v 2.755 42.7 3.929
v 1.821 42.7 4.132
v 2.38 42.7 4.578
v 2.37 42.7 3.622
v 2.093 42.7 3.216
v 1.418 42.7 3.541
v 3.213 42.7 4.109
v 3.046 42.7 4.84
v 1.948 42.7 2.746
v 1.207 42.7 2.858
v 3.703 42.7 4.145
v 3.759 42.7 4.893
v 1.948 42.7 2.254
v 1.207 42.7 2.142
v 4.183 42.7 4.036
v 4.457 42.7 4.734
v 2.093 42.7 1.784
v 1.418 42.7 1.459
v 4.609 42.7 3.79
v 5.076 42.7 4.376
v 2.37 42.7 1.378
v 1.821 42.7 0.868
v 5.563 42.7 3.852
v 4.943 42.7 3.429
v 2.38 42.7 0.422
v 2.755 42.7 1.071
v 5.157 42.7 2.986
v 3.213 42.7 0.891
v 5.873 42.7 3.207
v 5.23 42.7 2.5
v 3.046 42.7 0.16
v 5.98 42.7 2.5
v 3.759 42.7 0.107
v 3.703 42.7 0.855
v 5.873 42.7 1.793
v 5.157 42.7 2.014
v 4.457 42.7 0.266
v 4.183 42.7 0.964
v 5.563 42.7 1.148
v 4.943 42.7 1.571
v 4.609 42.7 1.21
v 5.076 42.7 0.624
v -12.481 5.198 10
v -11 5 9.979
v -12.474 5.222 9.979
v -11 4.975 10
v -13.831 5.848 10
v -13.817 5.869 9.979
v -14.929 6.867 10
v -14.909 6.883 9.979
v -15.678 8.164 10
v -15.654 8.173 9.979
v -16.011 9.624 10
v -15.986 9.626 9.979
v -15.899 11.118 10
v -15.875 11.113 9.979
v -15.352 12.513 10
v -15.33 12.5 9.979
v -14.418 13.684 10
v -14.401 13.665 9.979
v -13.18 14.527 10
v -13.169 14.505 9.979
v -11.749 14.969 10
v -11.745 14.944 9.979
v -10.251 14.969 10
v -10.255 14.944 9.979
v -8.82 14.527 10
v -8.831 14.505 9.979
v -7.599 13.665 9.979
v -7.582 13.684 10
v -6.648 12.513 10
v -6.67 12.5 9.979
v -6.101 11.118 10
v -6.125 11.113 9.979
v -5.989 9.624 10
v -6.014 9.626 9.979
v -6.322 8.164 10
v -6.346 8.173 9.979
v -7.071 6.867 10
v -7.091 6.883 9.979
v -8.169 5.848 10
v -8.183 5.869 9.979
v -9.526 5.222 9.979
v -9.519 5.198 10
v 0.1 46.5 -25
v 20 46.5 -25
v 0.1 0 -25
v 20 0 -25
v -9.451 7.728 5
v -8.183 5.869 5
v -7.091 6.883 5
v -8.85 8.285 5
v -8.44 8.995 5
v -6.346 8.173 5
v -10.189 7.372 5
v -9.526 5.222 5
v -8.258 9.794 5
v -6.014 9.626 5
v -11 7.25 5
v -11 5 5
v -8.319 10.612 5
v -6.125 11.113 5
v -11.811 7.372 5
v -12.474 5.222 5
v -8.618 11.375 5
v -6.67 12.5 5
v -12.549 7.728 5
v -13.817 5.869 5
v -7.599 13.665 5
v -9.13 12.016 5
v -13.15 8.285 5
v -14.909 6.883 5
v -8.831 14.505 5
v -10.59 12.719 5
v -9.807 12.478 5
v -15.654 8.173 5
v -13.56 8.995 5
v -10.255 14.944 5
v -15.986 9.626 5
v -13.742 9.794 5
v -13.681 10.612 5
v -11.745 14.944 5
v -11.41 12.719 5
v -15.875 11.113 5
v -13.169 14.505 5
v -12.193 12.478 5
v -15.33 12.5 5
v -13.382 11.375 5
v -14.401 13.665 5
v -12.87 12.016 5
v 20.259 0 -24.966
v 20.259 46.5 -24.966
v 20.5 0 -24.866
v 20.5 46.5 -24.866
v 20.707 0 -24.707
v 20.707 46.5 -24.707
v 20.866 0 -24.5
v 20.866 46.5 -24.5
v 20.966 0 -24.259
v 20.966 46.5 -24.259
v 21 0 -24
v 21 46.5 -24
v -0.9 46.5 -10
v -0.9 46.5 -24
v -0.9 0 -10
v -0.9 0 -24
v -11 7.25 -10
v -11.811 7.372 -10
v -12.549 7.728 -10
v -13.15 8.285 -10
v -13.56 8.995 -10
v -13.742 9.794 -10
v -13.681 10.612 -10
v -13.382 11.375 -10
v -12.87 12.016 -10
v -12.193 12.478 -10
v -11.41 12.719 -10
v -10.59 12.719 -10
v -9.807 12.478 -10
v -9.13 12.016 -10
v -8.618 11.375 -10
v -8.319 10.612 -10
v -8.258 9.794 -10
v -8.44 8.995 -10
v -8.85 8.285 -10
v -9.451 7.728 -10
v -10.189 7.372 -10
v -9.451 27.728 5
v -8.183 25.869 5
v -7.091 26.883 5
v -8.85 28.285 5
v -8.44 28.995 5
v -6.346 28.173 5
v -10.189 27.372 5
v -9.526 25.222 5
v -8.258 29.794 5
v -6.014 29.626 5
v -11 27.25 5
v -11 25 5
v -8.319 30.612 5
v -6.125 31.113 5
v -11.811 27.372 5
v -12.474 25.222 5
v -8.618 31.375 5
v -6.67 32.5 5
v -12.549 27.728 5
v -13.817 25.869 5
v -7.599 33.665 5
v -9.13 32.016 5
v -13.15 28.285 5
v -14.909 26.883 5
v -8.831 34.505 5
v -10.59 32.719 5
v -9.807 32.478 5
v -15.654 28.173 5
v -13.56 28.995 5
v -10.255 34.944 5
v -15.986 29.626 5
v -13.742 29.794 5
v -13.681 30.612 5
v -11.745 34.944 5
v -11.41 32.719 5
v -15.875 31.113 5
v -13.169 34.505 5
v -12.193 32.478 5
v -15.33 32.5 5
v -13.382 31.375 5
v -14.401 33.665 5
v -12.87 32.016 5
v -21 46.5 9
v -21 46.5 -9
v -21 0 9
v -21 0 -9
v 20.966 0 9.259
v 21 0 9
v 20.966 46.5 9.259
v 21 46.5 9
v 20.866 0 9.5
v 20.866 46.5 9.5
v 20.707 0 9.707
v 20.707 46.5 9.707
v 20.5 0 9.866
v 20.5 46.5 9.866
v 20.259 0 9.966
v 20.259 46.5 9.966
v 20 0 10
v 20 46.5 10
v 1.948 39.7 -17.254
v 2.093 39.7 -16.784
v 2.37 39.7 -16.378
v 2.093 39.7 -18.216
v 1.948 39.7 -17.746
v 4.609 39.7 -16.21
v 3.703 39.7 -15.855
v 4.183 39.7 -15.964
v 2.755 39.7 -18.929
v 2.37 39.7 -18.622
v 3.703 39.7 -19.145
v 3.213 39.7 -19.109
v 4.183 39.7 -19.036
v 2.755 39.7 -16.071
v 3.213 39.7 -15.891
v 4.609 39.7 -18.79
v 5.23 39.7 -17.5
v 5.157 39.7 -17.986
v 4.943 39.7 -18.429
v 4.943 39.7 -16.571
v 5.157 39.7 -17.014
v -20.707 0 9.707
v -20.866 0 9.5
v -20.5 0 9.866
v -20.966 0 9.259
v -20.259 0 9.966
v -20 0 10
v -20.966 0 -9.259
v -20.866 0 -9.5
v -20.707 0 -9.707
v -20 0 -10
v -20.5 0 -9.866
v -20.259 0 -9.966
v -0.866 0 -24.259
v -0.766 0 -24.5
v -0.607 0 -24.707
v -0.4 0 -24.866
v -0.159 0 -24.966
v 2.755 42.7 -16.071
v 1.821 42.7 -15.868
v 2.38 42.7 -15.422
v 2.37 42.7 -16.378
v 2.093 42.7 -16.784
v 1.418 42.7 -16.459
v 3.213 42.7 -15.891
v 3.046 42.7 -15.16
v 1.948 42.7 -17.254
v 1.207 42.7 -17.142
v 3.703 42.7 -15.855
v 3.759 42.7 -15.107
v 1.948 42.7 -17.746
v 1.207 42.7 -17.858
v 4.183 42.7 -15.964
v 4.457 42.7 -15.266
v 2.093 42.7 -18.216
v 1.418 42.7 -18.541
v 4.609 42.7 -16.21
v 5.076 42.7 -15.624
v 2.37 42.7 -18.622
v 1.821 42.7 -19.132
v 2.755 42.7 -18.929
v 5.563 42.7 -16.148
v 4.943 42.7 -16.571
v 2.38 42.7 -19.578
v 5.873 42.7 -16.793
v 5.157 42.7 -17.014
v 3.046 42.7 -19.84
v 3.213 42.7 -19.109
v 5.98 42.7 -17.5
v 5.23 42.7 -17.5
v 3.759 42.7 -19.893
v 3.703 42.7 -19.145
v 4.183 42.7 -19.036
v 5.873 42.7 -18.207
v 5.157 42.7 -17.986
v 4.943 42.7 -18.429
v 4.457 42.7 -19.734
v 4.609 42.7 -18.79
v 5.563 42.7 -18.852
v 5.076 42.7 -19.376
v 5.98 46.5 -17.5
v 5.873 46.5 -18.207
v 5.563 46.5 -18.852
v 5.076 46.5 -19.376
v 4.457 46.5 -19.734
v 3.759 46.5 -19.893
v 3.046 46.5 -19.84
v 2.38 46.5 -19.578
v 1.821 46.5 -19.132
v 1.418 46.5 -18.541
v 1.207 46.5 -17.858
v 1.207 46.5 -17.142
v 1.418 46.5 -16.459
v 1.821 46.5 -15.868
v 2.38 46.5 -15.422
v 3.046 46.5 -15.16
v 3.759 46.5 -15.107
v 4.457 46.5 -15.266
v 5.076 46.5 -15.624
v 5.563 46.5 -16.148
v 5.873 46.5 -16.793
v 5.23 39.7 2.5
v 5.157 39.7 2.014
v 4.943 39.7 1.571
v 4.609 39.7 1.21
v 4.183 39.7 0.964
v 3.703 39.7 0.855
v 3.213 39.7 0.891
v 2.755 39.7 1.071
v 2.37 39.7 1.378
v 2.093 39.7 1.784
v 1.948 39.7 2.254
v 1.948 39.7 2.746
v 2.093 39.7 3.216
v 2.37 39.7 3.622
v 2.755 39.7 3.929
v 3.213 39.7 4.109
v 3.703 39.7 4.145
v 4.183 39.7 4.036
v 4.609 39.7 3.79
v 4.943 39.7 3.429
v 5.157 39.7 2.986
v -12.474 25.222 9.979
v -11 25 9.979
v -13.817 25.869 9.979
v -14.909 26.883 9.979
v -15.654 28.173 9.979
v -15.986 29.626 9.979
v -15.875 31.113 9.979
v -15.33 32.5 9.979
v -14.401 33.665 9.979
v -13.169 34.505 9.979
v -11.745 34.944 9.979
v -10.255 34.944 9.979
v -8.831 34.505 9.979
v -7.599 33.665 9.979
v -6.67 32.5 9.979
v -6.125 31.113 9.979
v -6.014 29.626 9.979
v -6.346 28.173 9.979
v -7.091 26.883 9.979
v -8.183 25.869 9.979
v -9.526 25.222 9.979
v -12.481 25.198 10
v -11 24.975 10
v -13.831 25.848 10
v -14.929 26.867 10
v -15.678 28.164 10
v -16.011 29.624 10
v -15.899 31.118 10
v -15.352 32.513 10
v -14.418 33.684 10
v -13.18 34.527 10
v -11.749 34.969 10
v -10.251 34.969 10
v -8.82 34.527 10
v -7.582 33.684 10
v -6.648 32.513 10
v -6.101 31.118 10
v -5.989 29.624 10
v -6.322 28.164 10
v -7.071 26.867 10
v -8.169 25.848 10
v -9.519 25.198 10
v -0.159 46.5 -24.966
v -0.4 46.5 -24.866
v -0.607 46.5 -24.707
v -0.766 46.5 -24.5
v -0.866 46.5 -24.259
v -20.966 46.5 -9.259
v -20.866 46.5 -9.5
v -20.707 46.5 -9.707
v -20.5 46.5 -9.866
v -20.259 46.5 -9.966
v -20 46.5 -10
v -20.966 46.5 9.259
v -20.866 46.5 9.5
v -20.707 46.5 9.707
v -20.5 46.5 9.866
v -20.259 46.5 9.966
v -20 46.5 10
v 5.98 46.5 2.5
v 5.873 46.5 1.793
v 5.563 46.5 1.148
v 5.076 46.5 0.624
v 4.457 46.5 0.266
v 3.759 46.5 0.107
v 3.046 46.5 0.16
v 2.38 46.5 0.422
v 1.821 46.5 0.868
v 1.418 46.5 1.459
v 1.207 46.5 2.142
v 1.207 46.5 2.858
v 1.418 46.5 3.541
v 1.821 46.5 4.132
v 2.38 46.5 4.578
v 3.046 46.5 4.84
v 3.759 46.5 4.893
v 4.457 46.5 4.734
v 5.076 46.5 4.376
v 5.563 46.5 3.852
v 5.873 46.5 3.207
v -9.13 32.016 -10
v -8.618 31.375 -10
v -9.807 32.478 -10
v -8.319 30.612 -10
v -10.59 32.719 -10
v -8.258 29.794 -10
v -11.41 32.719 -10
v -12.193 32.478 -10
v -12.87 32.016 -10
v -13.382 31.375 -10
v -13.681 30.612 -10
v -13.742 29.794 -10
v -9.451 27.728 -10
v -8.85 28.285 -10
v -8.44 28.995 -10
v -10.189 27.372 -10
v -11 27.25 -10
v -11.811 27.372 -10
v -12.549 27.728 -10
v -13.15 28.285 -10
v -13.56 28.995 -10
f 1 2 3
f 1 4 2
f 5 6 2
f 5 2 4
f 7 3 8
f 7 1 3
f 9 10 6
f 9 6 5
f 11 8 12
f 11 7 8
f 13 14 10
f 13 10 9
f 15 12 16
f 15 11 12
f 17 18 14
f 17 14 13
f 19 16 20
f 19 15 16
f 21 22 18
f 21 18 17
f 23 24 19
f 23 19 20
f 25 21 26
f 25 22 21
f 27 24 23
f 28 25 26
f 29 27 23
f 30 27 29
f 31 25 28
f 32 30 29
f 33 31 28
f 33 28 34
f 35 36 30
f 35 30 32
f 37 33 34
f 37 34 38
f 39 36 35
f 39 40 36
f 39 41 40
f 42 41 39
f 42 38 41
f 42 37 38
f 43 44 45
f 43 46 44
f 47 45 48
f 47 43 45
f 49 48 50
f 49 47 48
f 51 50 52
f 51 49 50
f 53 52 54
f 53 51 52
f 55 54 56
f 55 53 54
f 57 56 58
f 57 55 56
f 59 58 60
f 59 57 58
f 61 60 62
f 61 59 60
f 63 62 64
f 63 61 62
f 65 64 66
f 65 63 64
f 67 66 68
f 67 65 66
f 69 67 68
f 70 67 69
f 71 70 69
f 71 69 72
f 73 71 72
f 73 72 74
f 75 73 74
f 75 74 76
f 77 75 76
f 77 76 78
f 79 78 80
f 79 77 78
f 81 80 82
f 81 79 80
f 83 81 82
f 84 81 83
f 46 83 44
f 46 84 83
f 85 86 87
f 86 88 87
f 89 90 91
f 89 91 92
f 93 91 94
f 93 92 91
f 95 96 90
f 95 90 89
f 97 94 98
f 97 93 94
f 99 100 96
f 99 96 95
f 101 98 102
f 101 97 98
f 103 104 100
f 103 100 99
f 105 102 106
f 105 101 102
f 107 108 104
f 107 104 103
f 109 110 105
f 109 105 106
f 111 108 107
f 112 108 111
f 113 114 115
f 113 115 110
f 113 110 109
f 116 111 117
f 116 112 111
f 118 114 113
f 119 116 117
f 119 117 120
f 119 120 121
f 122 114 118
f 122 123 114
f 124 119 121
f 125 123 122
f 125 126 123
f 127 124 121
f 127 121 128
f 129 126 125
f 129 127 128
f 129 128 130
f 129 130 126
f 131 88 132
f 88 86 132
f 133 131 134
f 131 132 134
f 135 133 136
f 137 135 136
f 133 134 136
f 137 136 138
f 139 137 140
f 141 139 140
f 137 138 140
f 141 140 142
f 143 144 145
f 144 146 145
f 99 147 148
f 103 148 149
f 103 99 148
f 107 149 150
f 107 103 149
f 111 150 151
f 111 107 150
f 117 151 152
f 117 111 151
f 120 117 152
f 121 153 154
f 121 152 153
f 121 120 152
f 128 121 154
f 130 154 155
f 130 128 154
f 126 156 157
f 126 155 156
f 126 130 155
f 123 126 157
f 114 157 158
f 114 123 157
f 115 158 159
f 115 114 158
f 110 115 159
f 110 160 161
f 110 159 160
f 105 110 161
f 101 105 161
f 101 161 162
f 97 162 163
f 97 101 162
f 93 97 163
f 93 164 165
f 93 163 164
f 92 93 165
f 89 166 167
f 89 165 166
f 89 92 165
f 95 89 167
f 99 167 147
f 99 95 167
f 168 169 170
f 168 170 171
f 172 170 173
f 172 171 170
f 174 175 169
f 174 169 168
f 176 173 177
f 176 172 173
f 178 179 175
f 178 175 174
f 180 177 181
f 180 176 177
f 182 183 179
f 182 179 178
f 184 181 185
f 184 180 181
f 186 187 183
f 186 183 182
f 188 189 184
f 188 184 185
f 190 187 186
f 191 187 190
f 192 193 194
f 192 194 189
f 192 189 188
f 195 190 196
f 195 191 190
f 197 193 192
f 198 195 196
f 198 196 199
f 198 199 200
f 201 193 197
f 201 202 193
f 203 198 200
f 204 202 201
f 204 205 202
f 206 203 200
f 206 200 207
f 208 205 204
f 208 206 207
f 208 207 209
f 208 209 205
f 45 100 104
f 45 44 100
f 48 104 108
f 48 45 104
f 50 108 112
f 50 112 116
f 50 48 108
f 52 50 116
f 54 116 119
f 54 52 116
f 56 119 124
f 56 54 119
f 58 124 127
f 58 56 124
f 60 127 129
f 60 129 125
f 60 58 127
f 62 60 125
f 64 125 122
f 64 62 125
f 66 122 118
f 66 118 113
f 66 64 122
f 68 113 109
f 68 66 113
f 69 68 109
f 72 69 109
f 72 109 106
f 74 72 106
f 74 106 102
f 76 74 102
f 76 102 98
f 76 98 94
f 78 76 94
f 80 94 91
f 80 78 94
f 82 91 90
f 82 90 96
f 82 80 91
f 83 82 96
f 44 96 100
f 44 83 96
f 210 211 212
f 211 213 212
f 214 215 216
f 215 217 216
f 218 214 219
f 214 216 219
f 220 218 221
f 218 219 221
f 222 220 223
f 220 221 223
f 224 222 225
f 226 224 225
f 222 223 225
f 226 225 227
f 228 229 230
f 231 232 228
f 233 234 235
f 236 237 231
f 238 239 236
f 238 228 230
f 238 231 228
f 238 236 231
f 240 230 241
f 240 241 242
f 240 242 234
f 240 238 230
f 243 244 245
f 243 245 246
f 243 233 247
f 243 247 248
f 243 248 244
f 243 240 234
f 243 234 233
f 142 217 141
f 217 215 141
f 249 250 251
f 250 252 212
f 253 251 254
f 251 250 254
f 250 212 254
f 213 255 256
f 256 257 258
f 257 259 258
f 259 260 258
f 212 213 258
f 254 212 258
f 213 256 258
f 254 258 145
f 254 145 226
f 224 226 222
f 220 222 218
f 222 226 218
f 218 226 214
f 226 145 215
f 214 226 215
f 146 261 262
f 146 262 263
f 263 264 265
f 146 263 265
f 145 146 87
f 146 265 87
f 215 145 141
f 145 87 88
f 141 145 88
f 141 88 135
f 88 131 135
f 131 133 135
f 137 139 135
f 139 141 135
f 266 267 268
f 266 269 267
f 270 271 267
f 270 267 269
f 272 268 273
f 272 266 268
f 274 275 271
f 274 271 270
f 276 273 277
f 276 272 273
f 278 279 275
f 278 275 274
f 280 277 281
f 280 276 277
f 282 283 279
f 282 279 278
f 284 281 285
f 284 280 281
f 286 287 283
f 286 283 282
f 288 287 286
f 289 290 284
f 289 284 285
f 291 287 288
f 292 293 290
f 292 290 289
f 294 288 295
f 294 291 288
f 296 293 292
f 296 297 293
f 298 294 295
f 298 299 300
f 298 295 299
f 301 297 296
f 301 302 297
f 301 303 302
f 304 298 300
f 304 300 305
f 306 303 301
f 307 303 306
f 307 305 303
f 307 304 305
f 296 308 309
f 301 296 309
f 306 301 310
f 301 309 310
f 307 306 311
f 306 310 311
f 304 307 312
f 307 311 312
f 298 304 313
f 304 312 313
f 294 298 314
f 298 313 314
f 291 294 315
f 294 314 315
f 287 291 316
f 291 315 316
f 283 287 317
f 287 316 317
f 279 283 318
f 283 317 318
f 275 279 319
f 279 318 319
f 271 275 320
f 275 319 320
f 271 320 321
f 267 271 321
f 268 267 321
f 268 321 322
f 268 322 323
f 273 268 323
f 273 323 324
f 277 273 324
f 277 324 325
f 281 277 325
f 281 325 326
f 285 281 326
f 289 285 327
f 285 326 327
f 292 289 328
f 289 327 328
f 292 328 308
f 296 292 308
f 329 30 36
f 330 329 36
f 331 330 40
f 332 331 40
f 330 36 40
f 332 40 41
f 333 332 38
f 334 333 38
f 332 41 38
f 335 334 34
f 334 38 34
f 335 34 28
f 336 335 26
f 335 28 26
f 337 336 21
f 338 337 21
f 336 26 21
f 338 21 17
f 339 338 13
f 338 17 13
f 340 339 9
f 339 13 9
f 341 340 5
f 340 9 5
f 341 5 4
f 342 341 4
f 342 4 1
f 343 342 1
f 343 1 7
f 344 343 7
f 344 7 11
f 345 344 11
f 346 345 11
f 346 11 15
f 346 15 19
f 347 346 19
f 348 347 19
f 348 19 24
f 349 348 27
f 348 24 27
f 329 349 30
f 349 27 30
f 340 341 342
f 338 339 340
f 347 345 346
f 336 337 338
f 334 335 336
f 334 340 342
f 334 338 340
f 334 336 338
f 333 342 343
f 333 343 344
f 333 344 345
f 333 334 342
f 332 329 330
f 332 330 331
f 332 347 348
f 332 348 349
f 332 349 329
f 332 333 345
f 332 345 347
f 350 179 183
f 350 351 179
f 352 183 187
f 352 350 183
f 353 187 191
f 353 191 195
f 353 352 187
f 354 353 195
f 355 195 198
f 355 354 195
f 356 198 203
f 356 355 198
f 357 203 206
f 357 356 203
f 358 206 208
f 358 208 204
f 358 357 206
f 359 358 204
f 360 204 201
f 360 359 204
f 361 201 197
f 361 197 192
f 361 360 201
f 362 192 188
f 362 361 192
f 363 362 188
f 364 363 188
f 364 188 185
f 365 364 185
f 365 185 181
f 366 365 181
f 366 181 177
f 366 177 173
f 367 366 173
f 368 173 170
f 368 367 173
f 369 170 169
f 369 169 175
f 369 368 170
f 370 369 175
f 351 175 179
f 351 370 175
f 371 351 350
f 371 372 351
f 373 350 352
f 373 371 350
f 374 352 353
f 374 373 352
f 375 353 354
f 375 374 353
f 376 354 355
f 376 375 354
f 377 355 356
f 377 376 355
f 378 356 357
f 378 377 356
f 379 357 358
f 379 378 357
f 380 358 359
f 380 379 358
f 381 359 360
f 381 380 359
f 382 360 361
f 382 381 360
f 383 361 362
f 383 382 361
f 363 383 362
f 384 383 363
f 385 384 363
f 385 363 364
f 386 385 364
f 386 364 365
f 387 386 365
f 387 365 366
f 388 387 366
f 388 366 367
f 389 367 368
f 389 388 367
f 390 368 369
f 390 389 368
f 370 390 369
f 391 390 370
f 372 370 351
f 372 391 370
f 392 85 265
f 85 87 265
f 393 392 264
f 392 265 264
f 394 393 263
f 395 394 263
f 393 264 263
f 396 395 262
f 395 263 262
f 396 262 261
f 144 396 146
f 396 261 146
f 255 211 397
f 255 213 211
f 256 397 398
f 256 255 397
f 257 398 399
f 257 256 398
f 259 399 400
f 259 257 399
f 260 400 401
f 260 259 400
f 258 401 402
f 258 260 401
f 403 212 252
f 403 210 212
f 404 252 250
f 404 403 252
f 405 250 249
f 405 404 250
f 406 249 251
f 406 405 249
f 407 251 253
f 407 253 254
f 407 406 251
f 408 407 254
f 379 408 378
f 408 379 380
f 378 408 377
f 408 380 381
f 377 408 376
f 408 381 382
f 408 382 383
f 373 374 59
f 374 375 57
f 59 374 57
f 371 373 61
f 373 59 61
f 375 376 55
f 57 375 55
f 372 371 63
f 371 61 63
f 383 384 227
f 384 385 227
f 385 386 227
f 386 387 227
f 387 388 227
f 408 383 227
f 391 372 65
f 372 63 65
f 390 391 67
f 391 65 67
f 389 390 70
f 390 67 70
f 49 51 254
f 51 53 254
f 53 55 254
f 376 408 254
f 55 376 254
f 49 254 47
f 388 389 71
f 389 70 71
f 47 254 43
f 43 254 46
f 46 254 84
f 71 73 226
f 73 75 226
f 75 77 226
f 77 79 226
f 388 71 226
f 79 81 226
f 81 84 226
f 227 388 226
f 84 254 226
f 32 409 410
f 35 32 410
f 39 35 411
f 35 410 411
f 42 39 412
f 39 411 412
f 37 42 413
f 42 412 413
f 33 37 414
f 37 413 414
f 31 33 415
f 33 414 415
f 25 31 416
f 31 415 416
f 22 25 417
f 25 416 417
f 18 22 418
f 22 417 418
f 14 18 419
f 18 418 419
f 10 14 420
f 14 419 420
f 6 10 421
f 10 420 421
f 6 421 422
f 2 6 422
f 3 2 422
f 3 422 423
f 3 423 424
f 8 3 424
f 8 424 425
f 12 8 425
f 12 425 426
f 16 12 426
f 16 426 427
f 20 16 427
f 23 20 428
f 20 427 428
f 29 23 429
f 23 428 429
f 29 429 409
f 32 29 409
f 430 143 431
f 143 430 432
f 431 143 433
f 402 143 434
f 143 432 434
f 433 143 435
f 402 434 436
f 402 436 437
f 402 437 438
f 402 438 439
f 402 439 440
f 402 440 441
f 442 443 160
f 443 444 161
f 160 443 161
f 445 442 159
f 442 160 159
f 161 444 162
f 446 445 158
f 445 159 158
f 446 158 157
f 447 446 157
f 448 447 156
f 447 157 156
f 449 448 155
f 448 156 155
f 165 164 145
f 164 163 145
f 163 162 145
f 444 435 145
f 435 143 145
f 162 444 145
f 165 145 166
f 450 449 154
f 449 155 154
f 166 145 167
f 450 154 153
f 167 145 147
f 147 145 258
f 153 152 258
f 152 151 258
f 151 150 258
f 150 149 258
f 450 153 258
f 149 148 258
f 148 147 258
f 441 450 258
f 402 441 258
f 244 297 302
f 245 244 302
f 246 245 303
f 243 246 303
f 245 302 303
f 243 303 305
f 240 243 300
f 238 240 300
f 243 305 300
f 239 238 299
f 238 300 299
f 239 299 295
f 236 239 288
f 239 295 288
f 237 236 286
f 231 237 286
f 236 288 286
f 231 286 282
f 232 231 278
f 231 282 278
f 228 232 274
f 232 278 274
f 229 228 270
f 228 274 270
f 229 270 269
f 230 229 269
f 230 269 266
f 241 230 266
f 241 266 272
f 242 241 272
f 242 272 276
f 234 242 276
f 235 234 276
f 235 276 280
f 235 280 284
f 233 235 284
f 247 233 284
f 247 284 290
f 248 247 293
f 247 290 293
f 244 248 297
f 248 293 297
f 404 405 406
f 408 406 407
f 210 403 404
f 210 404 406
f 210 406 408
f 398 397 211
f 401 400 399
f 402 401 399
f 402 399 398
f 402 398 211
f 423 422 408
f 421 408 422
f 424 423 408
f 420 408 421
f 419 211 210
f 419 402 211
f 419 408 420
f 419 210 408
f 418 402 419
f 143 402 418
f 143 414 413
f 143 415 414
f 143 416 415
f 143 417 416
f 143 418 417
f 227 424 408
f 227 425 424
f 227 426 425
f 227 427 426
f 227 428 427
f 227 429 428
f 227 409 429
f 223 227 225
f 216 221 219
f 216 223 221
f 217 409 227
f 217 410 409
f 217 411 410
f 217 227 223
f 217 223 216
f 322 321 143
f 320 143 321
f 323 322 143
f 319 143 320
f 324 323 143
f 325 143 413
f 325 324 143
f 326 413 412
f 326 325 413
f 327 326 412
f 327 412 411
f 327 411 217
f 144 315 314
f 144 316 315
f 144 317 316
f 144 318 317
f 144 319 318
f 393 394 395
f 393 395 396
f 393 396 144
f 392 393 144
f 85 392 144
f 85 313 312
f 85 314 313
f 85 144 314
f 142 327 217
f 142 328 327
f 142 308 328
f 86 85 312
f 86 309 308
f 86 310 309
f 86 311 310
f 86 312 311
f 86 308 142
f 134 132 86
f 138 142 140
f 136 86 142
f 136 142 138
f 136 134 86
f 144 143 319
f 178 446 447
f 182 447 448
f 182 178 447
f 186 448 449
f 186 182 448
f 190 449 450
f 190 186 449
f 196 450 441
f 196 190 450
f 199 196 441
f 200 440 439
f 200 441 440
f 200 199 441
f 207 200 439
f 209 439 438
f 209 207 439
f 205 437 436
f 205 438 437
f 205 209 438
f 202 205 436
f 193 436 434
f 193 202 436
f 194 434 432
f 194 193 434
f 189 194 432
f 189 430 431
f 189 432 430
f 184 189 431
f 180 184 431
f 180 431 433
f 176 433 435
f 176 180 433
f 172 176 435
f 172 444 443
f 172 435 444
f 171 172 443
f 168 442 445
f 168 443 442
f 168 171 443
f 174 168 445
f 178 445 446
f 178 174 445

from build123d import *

# Parameters (mm, degrees)
SKETCH1_W                     = 42
SKETCH1_H                     = 20
BOSS_EXTRUDE1_DEPTH           = 40
SKETCH2_W                     = 21.9
SKETCH2_H                     = 15
BOSS_EXTRUDE2_DEPTH           = 40
CBORE_FOR_M5_SHCS1_AT_2_COUNT = 2
CBORE_FOR_M5_SHCS1_AT_2_PITCH = 20
BOSS_EXTRUDE3_DEPTH           = 6.5
FILLET1_R                     = 1
SKETCH8_R                     = 2.4
CUT_EXTRUDE1_DEPTH            = 3.8
SKETCH9_R                     = 1.65
CUT_EXTRUDE2_DEPTH            = 3


with BuildPart() as part:
    # Sketch1 → Boss-Extrude1 (new body)
    with BuildSketch(Plane(origin=(0, 0, 0), x_dir=(1, 0, 0), z_dir=(0, 1, 0))):
        Rectangle(SKETCH1_W, SKETCH1_H)
    extrude(amount=BOSS_EXTRUDE1_DEPTH)

    # Sketch2 → Boss-Extrude2 (add)
    with BuildSketch(Plane(origin=(0, 40, 0), x_dir=(1, 0, 0), z_dir=(0, 1, 0))):
        with Locations((10.05, 17.5)):
            Rectangle(SKETCH2_W, SKETCH2_H)
    extrude(amount=-BOSS_EXTRUDE2_DEPTH)

    # Sketch5 → CBORE for M5 SHCS1 (revolve, cut)
    with BuildSketch(Plane(origin=(-11, 30, 10), x_dir=(0, -1, 0), z_dir=(1, 0, 0))):
        Polygon((0, 0), (0, 35), (2.75, 35), (2.75, 5), (5, 5), (5, 0.020977491), (5.025, 0), align=None)
    cbore_for_m5_shcs1 = revolve(axis=Axis((-11, 30, 16.35), (0, 0, -1)), mode=Mode.SUBTRACT)

    # CBORE for M5 SHCS1 at 2: CBORE for M5 SHCS1 ×2
    with Locations(*[(0, -i * CBORE_FOR_M5_SHCS1_AT_2_PITCH, 0) for i in range(1, CBORE_FOR_M5_SHCS1_AT_2_COUNT)]):
        add(cbore_for_m5_shcs1, mode=Mode.SUBTRACT)

    # Sketch6 → Boss-Extrude3 (add)
    with BuildSketch(Plane(origin=(0, 40, 0), x_dir=(1, 0, 0), z_dir=(0, 1, 0))):
        Polygon((-21, 10), (-21, -10), (21, -10), (21, 25), (-0.9, 25), (-0.9, 10), align=None)
    extrude(amount=BOSS_EXTRUDE3_DEPTH)

    # Fillet1
    fillet1_edges = [part.edges().sort_by_distance(p)[0] for p in [
        (-0.9, 23.25, -25),
        (21, 23.25, -25),
        (-21, 23.25, -10),
        (21, 23.25, 10),
        (-21, 23.25, 10),
    ]]
    fillet(fillet1_edges, radius=FILLET1_R)

    # Sketch8 → Cut-Extrude1 (cut)
    with BuildSketch(Plane(origin=(0, 46.5, 0), x_dir=(1, 0, 0), z_dir=(0, 1, 0))):
        with Locations((3.58, 17.5)):
            Circle(SKETCH8_R)
        with Locations((3.58, -2.5)):
            Circle(SKETCH8_R)
    extrude(amount=-CUT_EXTRUDE1_DEPTH, mode=Mode.SUBTRACT)

    # Sketch9 → Cut-Extrude2 (cut)
    with BuildSketch(Plane(origin=(0, 42.7, 0), x_dir=(1, 0, 0), z_dir=(0, 1, 0))):
        with Locations((3.58, 17.5)):
            Circle(SKETCH9_R)
        with Locations((3.58, -2.5)):
            Circle(SKETCH9_R)
    extrude(amount=-CUT_EXTRUDE2_DEPTH, mode=Mode.SUBTRACT)


solid = part.part
